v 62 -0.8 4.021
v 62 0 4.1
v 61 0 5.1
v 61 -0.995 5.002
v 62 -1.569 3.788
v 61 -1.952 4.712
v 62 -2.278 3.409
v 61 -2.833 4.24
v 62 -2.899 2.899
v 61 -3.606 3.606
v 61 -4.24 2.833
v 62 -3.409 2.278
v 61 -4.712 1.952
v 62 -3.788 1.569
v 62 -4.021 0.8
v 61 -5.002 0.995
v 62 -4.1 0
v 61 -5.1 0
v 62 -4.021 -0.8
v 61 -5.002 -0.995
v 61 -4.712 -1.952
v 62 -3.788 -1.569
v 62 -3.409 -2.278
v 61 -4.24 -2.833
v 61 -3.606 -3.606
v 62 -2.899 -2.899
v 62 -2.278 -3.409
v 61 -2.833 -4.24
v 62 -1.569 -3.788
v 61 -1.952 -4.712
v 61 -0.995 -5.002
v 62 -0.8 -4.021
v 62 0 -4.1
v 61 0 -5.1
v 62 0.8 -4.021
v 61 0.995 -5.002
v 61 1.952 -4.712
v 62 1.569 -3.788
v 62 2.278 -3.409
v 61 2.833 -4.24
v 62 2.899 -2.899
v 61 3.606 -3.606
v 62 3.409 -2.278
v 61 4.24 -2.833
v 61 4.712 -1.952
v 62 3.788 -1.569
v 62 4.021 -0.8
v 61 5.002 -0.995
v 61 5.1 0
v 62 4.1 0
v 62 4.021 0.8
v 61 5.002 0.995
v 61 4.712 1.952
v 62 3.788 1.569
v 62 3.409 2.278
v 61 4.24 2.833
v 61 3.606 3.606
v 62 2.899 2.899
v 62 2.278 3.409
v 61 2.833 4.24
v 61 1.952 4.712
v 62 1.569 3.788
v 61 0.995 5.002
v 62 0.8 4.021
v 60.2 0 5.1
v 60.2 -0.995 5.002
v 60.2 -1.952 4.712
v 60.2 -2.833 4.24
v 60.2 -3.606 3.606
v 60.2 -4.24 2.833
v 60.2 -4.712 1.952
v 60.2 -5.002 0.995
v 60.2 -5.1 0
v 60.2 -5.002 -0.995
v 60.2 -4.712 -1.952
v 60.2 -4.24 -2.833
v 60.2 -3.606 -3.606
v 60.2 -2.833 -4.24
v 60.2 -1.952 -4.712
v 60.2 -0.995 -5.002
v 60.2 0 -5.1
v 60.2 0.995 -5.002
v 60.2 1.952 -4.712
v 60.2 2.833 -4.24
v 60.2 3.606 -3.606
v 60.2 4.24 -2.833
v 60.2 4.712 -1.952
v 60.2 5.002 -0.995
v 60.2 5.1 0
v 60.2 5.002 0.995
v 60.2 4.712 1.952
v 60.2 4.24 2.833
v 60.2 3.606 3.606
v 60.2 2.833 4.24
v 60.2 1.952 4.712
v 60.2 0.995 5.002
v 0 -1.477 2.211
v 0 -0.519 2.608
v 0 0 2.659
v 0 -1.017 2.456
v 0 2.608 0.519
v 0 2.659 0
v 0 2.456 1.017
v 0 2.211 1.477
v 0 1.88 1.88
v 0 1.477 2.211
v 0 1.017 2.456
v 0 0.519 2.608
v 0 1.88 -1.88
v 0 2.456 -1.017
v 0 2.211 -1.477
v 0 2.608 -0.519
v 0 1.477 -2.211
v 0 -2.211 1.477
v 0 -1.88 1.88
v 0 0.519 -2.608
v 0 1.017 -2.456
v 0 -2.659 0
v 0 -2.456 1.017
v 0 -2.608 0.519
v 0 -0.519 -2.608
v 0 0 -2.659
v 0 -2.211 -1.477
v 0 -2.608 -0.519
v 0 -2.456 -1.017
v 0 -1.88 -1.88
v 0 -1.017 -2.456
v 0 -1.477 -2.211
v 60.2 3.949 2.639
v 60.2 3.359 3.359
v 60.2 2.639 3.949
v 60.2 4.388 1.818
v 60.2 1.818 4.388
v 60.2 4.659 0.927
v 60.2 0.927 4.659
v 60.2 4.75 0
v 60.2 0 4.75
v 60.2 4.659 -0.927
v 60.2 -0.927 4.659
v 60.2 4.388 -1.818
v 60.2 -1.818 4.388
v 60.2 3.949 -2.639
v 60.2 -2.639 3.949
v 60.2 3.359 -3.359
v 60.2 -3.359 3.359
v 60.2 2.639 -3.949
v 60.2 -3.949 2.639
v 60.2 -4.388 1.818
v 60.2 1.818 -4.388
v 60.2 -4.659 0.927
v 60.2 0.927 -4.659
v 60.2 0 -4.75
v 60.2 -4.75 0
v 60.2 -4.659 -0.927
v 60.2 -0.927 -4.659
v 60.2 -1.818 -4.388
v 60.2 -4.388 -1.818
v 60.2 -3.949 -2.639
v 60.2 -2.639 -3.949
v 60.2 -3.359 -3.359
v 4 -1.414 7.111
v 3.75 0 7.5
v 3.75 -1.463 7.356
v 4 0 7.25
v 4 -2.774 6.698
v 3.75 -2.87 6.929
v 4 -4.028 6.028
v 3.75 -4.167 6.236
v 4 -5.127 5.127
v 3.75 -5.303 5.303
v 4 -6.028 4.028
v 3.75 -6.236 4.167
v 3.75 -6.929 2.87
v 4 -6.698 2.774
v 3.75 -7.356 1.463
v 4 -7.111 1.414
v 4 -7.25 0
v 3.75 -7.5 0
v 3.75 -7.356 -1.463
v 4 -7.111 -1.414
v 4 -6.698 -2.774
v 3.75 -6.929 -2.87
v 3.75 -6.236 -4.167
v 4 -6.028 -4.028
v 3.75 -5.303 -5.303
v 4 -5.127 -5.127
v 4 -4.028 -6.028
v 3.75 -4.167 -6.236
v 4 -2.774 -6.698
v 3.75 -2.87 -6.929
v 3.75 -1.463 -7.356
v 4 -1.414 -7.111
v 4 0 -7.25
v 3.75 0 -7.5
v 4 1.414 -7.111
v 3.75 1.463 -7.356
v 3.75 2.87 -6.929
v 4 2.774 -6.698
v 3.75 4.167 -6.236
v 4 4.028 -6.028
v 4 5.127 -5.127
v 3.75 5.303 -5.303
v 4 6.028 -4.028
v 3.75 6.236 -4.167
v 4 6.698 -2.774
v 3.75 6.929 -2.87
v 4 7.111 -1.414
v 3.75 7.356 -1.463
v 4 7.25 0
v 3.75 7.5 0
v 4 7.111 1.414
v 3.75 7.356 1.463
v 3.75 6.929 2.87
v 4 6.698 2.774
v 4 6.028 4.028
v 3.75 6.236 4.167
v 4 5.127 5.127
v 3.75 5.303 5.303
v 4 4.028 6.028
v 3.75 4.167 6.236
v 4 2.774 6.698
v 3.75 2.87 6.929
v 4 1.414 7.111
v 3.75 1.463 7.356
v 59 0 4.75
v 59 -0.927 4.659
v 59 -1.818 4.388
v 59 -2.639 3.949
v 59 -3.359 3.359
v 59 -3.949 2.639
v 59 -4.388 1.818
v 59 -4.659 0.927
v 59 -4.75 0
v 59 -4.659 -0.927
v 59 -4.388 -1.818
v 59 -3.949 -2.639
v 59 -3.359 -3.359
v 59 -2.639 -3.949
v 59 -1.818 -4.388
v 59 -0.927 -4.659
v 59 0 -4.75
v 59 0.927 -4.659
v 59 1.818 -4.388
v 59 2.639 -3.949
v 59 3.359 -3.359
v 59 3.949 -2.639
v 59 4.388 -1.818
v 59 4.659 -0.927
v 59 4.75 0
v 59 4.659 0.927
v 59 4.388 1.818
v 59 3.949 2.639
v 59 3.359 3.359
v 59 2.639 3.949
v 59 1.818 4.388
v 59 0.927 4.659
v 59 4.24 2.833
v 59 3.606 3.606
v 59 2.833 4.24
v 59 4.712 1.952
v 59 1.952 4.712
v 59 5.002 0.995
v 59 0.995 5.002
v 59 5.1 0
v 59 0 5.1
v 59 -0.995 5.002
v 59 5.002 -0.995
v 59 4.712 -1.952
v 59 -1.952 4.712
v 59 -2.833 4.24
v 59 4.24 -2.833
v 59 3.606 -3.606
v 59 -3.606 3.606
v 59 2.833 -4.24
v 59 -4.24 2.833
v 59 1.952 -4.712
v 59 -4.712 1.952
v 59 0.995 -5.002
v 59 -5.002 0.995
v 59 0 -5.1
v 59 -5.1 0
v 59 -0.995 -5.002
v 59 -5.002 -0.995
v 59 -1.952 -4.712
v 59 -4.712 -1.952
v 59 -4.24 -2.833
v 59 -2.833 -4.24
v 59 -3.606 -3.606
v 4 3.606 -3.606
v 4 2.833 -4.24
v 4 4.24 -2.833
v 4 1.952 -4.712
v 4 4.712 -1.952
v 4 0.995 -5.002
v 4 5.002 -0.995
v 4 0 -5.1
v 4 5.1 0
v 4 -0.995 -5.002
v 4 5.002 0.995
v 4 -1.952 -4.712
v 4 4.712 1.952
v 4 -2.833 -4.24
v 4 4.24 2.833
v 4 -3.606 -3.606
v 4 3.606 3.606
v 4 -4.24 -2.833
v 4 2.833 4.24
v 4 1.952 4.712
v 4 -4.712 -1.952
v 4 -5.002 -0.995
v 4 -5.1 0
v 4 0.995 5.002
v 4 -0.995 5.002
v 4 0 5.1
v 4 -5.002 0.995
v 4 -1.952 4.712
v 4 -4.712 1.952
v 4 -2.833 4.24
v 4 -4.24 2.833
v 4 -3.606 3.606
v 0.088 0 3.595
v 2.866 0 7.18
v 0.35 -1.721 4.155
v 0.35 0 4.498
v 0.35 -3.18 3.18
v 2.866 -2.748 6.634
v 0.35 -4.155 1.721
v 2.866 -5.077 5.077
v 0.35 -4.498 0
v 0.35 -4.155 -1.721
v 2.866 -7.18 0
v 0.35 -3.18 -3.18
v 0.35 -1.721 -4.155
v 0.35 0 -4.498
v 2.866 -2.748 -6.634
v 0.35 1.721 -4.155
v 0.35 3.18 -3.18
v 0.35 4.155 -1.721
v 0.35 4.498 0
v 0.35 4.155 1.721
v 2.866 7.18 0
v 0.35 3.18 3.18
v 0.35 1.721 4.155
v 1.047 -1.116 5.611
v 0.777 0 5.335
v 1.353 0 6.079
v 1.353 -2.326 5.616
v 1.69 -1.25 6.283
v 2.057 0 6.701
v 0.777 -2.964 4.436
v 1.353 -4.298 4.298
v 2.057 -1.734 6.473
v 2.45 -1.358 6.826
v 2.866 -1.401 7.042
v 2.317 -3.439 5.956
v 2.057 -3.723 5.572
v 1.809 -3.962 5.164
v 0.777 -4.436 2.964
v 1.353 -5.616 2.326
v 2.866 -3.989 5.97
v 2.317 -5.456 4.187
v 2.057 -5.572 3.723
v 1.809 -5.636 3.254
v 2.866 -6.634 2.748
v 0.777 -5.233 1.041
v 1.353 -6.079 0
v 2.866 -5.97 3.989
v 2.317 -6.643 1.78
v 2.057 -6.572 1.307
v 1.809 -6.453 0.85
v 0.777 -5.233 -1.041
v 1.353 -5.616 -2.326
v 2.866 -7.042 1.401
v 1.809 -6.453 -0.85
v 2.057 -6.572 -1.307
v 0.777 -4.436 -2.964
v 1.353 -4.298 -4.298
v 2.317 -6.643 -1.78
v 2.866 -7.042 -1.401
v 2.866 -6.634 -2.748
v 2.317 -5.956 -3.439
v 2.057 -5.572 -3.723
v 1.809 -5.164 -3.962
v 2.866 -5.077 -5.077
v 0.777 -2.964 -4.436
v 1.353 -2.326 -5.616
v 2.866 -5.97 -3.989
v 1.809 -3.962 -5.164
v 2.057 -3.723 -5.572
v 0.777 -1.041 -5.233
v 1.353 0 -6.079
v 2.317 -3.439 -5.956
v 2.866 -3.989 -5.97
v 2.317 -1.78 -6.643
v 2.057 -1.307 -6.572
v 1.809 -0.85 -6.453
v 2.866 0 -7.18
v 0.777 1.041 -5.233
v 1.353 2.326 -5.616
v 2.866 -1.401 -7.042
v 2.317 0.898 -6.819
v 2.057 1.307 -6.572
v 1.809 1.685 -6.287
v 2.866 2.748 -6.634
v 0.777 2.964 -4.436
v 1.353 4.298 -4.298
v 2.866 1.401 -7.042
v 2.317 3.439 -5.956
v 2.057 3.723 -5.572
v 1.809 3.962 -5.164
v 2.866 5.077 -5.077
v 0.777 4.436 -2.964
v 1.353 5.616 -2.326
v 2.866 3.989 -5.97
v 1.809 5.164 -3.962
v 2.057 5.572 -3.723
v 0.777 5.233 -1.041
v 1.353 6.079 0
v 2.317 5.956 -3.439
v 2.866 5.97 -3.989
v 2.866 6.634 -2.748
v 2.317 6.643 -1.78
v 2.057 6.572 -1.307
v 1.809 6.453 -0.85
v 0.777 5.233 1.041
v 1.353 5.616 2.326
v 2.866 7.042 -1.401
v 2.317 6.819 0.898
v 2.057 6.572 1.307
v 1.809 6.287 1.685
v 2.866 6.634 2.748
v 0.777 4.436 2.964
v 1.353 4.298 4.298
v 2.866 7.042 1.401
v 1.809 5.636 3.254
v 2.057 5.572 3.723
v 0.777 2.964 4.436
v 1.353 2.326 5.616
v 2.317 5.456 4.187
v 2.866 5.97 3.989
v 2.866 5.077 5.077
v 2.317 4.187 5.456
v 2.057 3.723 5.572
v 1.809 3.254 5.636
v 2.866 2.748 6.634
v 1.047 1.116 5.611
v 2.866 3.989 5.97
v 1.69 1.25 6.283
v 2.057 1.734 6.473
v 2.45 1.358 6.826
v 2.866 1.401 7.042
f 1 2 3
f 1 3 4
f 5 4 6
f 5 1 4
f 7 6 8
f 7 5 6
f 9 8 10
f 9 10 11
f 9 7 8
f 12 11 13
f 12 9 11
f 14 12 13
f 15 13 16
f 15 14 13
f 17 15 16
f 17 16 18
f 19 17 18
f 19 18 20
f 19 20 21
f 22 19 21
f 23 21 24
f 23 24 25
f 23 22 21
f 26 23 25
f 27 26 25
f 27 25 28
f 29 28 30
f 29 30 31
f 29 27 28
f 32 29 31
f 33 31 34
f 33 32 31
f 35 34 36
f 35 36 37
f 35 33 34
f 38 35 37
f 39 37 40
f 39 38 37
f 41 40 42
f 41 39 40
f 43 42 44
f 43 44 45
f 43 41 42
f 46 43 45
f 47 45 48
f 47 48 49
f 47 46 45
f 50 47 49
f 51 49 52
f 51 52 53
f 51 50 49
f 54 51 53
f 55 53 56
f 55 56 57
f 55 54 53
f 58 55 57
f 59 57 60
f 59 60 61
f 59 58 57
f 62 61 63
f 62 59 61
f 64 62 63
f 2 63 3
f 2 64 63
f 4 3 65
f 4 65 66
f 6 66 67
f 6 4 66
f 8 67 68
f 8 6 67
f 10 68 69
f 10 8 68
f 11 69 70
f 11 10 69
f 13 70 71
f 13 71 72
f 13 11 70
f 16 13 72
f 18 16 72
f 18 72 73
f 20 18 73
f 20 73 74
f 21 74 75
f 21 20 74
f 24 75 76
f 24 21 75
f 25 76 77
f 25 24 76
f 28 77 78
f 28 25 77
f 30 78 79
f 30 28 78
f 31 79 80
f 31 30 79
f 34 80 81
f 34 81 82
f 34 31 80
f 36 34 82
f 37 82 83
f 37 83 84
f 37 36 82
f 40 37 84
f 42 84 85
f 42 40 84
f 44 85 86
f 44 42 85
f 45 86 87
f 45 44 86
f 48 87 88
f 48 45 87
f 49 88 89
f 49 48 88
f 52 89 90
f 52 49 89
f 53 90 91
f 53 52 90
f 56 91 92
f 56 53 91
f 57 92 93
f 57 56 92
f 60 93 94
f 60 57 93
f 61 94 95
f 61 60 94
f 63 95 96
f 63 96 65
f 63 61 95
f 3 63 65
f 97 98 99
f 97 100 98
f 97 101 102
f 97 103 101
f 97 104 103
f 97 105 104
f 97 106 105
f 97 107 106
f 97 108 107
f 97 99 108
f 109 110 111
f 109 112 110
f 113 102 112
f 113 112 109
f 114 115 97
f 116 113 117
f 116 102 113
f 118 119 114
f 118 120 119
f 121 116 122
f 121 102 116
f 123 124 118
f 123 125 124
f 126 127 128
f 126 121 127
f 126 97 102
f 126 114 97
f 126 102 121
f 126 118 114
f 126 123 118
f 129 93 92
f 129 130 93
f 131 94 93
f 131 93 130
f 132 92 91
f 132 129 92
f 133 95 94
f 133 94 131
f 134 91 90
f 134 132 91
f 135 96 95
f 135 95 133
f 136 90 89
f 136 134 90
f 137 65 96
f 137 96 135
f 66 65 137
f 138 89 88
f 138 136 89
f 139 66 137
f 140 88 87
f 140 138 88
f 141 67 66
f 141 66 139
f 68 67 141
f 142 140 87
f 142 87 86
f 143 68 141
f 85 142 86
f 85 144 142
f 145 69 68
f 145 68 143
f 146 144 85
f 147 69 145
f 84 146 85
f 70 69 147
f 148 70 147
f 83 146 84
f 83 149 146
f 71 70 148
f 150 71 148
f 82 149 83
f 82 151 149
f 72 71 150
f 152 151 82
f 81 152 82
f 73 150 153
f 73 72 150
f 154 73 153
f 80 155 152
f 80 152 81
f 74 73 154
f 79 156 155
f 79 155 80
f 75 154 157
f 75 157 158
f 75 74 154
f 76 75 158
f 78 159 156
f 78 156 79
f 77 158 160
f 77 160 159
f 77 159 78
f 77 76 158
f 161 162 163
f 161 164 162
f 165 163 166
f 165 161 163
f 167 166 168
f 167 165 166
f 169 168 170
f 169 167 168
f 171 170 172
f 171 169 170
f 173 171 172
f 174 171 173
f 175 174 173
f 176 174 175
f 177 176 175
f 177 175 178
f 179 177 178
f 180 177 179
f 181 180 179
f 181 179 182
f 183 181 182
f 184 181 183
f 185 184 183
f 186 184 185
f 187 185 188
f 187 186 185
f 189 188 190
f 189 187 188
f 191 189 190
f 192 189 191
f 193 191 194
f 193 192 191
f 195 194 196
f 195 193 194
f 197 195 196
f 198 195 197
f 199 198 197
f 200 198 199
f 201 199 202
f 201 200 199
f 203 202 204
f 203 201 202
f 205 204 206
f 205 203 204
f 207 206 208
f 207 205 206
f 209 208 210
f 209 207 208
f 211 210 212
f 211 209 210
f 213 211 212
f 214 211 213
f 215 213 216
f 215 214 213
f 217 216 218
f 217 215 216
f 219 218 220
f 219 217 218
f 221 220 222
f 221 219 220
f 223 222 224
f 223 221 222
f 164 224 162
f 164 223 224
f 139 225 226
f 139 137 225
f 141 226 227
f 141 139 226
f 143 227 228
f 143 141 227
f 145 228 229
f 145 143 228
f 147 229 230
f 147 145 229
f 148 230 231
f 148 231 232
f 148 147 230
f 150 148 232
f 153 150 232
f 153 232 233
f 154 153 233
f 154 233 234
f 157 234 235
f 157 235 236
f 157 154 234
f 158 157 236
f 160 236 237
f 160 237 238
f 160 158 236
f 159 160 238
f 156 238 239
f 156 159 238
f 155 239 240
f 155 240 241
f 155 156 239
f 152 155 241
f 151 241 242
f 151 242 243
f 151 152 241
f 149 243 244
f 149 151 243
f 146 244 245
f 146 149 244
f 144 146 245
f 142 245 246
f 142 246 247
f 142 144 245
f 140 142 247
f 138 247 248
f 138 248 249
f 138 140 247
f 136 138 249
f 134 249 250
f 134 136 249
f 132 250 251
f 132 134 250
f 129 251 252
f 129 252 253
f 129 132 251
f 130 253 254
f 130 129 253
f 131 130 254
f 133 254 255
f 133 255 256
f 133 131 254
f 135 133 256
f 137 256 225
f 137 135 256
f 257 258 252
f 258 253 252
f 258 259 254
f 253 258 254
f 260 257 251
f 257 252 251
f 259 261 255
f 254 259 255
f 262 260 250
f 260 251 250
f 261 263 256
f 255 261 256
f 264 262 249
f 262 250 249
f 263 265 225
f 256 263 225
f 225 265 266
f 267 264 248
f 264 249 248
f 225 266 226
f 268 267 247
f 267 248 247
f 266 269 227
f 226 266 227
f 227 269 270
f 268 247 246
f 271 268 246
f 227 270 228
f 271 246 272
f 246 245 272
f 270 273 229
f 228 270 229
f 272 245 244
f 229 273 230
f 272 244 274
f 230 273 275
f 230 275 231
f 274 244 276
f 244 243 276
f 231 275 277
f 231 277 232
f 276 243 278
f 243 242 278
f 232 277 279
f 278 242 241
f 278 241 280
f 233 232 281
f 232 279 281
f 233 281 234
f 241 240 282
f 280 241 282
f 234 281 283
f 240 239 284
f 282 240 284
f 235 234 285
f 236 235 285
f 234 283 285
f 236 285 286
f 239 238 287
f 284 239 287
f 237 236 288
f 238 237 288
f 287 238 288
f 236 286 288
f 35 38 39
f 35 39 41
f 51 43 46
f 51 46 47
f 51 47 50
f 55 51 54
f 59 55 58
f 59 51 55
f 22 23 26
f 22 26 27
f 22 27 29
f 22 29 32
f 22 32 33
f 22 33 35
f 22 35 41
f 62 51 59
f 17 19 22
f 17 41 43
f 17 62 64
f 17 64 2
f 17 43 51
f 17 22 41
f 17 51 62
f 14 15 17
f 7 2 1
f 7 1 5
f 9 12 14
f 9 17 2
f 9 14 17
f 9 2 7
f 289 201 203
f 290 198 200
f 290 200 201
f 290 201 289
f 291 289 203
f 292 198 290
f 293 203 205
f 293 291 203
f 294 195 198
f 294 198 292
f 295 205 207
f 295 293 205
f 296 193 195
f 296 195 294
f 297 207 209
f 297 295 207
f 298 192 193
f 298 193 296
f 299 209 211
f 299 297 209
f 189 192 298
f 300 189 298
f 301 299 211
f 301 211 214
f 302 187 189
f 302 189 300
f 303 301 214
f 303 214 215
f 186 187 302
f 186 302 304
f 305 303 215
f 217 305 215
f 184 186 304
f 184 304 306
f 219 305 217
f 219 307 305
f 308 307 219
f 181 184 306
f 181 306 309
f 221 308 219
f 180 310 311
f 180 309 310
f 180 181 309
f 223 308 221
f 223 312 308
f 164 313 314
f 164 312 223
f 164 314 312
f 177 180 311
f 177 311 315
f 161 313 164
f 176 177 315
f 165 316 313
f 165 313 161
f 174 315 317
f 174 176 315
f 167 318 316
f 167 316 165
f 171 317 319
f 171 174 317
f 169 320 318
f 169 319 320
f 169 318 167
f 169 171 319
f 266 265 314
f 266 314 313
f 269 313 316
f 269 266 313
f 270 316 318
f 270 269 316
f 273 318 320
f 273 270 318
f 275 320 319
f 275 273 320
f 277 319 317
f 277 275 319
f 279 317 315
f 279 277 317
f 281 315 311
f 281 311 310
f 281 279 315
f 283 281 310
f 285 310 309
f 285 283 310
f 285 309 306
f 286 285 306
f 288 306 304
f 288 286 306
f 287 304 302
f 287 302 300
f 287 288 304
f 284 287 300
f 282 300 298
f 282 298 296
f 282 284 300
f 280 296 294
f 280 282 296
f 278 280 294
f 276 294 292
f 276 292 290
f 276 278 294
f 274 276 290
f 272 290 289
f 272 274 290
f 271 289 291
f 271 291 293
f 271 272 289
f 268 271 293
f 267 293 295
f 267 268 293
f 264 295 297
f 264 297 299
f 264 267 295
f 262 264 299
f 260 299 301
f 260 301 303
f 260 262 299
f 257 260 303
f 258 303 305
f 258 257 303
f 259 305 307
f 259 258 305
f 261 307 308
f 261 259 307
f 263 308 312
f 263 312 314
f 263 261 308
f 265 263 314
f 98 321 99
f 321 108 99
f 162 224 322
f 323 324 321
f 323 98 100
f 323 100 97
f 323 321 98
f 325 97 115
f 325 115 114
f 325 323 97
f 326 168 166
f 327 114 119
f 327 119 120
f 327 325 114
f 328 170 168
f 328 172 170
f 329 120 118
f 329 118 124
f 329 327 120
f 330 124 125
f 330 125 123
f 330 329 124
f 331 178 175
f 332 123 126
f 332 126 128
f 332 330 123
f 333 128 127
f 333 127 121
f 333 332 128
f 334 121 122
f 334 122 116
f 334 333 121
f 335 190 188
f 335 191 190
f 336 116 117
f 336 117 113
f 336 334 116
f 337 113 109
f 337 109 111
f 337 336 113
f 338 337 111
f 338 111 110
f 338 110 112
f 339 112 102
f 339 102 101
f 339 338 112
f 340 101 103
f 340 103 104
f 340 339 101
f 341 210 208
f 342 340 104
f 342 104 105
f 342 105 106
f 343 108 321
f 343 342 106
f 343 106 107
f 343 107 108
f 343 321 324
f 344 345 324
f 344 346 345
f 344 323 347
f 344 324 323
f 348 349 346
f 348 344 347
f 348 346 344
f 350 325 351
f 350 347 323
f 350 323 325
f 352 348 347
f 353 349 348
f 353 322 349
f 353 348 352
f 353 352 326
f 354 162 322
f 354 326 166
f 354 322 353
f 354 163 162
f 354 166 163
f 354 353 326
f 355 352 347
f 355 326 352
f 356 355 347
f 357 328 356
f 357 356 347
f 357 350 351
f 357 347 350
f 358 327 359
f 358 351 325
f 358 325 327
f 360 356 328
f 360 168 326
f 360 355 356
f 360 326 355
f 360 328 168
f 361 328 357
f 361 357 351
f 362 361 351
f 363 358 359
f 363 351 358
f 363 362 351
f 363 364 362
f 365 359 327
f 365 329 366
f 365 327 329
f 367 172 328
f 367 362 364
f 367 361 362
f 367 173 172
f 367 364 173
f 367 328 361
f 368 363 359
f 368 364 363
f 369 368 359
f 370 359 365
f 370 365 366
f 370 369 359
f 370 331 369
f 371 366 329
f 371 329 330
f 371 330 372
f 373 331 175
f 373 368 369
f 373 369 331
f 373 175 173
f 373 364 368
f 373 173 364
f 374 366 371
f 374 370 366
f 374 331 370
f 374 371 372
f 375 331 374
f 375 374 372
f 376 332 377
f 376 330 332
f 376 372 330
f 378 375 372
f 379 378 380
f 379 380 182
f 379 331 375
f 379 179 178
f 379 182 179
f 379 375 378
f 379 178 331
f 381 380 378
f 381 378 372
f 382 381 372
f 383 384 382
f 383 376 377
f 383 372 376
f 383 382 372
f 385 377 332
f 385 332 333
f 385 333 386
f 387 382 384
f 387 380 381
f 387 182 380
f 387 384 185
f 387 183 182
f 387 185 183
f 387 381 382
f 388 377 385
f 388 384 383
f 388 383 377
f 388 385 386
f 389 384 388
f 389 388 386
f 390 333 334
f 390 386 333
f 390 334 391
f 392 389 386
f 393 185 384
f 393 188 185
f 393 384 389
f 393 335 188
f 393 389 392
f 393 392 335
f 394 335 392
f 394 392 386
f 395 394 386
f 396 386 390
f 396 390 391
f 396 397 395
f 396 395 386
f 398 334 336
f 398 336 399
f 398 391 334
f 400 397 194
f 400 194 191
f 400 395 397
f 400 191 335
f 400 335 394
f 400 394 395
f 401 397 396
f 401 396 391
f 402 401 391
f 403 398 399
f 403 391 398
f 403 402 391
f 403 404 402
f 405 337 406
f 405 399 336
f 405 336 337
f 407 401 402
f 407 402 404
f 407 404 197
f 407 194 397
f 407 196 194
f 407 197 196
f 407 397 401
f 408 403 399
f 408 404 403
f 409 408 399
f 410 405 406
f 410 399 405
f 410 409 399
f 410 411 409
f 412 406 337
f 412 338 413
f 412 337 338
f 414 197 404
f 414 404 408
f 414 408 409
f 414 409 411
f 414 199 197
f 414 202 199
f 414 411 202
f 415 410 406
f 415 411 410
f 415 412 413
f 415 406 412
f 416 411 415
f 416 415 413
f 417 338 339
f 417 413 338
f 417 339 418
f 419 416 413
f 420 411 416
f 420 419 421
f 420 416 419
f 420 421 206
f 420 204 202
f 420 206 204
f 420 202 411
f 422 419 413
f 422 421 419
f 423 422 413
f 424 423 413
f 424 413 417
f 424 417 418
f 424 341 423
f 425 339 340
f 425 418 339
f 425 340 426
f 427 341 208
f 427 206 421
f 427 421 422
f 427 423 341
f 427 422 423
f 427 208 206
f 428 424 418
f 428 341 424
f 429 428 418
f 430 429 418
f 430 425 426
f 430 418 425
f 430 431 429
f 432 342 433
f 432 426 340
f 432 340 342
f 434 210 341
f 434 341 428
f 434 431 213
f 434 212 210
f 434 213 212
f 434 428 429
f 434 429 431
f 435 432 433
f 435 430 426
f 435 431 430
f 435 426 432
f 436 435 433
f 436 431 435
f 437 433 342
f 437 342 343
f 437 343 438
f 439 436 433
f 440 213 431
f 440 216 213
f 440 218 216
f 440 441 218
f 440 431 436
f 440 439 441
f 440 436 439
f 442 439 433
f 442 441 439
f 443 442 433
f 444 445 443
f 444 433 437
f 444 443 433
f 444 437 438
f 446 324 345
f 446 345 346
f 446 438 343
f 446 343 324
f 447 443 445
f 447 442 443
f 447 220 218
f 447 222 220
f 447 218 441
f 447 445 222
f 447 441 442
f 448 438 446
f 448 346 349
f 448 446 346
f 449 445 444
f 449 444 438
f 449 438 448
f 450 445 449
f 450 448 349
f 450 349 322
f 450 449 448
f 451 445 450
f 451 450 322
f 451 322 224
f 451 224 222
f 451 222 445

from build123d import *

# Parameters (mm, degrees)
CHAMFER_1_SIZE = 0.25
SKETCH_2_W     = 1.2
SKETCH_2_H     = 0.35
FILLET_1_R     = 5
CHAMFER_2_SIZE = 1


with BuildPart() as part:
    # Эскиз1 → Повернуть1 (revolve)
    with BuildSketch(Plane.XY, mode=Mode.PRIVATE) as revolve_1_sk:
        Polygon((0, 0), (0, 7.5), (4, 7.5), (4, 5.1), (62, 5.1), (62, 0), align=None)
    revolve(revolve_1_sk.sketch.rotate(Axis((0, 0, 0), (1, 0, 0)), 90), axis=Axis((0, 0, 0), (1, 0, 0)))

    # Фаска1
    chamfer_1_edges = [part.edges().sort_by_distance(p)[0] for p in [
        (4, 0, -7.5),
    ]]
    chamfer(chamfer_1_edges, length=CHAMFER_1_SIZE)

    # Эскиз2 → Вырез-Повернуть1 (revolve, cut)
    with BuildSketch(Plane.XY, mode=Mode.PRIVATE) as cut_revolve_1_sk:
        with Locations((59.6, 4.925)):
            Rectangle(SKETCH_2_W, SKETCH_2_H)
    revolve(cut_revolve_1_sk.sketch.rotate(Axis((0, 0, 0), (1, 0, 0)), 90), axis=Axis((0, 0, 0), (1, 0, 0)), mode=Mode.SUBTRACT)

    # Скругление1
    # the kernel refuses this fillet: 5 mm, written as the material it takes off along each edge
    with BuildSketch(Plane(origin=(0, 0, 0), x_dir=(0, 0, 1), z_dir=(0, 1, 0))) as fillet_1_piece_1:
        with BuildLine():
            CenterArc((2.658770817, 5), FILLET_1_R, 270, 75.522487814)
            Line((2.658770817, 0), (2.658770817, -0.1))
            Line((2.658770817, -0.1), (7.5, -0.1))
            Line((7.5, -0.1), (7.6, 0))
            ThreePointArc((7.6, 0), (7.6, 1.875), (7.596824584, 3.725))
            Line((7.596824584, 3.725), (7.5, 3.75))
        make_face()
    revolve(axis=Axis((0, 0, 0), (1, 0, 0)), mode=Mode.SUBTRACT)

    # Фаска2
    chamfer_2_edges = [part.edges().sort_by_distance(p)[0] for p in [
        (62, 0, -5.1),
    ]]
    chamfer(chamfer_2_edges, length=CHAMFER_2_SIZE)


solid = part.part
